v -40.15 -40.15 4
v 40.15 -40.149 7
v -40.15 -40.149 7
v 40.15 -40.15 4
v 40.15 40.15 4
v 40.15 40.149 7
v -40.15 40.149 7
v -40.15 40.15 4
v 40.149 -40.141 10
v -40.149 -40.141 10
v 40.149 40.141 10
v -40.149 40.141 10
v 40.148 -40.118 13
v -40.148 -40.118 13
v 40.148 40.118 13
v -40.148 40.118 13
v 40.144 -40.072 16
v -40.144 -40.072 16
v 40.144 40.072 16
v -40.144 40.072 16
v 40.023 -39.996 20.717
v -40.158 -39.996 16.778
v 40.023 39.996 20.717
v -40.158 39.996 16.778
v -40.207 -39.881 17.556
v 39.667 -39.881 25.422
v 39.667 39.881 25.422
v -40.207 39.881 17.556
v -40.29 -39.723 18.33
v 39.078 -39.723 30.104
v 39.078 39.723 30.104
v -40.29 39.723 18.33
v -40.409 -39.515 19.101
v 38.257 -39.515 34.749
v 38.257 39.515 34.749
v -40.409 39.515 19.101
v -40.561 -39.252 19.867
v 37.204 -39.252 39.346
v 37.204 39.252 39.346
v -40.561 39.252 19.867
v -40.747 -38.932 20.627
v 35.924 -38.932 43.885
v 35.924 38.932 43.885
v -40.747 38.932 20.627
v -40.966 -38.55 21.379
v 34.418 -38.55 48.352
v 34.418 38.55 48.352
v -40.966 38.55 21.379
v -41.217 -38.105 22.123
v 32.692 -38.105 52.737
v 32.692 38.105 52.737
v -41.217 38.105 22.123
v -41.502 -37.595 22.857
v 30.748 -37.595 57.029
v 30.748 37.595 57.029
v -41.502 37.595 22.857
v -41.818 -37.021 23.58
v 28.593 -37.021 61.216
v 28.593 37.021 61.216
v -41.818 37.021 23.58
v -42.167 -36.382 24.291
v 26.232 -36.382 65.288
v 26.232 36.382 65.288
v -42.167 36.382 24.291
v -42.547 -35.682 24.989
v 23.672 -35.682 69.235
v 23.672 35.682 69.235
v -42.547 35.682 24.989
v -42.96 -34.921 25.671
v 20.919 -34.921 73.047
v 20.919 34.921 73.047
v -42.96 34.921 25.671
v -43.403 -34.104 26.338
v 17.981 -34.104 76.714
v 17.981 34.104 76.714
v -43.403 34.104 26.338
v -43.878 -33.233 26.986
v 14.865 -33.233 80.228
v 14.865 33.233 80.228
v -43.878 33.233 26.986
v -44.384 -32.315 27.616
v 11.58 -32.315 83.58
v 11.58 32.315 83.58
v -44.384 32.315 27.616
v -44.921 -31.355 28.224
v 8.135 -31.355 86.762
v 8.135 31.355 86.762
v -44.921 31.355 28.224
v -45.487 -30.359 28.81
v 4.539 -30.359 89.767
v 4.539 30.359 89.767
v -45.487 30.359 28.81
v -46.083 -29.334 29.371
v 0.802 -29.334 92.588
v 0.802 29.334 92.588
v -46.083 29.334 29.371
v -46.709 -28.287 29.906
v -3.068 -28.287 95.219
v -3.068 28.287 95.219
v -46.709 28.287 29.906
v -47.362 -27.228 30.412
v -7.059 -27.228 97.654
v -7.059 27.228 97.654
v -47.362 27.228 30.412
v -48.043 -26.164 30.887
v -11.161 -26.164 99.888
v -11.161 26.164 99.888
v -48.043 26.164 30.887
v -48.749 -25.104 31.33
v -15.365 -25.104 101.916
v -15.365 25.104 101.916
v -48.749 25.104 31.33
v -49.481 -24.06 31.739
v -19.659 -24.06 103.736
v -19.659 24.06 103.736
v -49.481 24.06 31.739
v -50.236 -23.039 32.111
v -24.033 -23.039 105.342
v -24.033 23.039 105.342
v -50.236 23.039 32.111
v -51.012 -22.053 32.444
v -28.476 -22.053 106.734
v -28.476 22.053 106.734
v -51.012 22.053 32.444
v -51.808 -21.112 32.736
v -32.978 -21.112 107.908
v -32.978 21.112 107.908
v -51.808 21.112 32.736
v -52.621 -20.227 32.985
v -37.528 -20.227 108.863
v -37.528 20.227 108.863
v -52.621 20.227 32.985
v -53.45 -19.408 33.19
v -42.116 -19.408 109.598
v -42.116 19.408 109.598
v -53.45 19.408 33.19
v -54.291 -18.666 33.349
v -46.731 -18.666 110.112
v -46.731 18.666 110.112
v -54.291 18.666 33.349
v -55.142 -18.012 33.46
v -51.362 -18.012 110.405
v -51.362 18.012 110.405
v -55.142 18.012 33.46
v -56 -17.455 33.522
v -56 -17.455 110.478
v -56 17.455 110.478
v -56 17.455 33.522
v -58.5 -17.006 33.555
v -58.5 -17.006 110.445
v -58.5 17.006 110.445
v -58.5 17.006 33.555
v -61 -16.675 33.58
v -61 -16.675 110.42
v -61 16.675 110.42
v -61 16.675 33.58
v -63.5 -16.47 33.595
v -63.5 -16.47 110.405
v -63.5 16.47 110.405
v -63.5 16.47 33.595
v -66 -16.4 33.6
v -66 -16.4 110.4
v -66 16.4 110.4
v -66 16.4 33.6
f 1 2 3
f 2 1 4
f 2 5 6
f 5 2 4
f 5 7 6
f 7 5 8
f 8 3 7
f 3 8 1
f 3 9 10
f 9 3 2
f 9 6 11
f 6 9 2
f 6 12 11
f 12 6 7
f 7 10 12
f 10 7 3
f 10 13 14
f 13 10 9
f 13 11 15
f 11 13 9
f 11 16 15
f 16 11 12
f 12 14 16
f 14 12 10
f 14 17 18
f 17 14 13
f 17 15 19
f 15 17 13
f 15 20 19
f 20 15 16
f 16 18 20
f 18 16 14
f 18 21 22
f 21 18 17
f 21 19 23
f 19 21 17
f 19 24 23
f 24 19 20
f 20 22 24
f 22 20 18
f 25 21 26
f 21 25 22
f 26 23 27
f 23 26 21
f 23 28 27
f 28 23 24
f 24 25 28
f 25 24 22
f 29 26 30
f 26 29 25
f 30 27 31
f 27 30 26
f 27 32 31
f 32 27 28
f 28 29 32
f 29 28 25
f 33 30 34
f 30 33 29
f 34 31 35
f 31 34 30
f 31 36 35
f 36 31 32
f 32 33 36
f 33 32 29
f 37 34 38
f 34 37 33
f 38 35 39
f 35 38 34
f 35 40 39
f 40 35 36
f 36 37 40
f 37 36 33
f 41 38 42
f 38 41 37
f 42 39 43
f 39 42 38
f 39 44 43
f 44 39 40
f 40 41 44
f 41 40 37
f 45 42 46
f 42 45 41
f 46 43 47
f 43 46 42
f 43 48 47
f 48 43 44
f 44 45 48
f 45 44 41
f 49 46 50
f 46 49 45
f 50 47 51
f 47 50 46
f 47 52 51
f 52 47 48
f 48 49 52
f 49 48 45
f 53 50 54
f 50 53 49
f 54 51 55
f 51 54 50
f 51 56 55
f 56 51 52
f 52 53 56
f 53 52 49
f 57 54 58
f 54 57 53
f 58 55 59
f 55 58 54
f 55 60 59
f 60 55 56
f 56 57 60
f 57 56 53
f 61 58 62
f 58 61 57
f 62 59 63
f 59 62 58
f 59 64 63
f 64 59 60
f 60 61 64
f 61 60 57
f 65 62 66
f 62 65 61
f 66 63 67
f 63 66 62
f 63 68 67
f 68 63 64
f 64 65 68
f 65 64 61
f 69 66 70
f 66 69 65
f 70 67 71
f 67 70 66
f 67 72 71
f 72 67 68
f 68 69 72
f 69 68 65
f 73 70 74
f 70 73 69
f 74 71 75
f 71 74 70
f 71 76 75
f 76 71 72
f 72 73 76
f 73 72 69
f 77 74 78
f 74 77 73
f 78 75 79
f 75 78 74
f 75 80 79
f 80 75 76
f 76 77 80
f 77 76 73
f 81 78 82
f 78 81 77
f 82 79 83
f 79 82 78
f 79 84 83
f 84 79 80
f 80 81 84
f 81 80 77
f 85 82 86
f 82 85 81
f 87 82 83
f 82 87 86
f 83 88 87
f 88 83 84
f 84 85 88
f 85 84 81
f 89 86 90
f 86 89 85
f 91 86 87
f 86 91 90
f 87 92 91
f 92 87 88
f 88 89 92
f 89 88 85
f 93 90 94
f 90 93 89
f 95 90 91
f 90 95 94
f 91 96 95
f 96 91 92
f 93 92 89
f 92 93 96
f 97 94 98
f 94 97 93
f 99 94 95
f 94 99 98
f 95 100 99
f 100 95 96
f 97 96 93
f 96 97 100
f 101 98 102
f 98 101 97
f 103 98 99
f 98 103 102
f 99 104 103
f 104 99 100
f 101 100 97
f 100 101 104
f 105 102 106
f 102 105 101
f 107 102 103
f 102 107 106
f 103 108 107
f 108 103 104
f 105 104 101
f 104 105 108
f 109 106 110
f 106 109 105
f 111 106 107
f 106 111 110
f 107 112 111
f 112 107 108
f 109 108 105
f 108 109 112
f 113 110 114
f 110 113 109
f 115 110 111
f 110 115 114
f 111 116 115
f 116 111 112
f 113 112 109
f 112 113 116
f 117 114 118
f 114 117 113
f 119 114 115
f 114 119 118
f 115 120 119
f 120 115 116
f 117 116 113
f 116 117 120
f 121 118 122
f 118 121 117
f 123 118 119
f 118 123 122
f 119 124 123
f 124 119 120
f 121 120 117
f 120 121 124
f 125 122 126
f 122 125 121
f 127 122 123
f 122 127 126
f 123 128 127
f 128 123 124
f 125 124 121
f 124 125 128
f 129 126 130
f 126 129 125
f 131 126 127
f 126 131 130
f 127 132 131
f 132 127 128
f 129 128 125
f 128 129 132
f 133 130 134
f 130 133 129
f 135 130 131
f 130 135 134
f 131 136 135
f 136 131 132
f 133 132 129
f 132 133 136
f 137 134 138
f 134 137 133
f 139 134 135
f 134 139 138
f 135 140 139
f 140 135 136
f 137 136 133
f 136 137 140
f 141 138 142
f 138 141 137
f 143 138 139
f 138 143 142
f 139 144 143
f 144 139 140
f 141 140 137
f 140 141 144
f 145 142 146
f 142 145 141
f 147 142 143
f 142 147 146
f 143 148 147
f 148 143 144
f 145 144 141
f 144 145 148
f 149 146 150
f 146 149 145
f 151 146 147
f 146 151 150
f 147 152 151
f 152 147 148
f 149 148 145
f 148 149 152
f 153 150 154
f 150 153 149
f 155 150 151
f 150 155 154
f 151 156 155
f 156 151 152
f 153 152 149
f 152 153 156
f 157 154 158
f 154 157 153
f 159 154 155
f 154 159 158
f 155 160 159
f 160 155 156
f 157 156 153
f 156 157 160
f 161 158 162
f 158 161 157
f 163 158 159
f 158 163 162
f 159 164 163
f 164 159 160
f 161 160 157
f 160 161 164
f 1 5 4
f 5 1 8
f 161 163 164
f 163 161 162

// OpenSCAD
// 80 mm case fan -> 72 x 28 mm right-angle duct adapter
//
// Axis convention
//   Fan flange lies in the XY plane (z = 0 .. flange_t), air enters along +Z.
//   The 90 deg turn happens in the XZ plane, so the bend axis is Y.
//   The 28 mm outlet side is parallel to that bend axis (Y).
//   The 72 mm outlet side is the in-plane / radial dimension (Z at the outlet).
//   Air exits along -X.
//
// The duct is a watertight loft of matching rectangular rings along a
// vertical-lead + circular-arc + horizontal-lead path. Inner and outer lofts
// are differenced, then a fan flange and outlet rim are unioned on.
//
// Units: mm.

$fn = 64;

// ---------------- user parameters ----------------
fan_frame      = 80;     // nominal fan frame (informational)
fan_hole_pitch = 71.5;   // standard 80 mm fan mounting hole spacing
fan_hole_d     = 4.5;    // clearance for M4 screws

inlet_clear    = 75.5;   // clear square throat at the fan
wall           = 2.4;    // duct wall thickness
flange_t       = 5.0;    // fan-side flange thickness
flange_outer   = 88;     // fan-side flange outer size

out_radial     = 72;     // outlet clear dimension IN the bend plane (Z)
out_axis       = 28;     // outlet clear dimension ALONG bend axis (Y)
out_lip        = 10;     // straight horizontal run after the arc
rim_t          = 3.0;    // outlet rim axial thickness
rim_extra      = 3.0;    // outlet rim overhang per side

center_R       = 56;     // centerline radius of the 90 deg bend
lead_in        = 12;     // straight vertical lead before the arc

n_straight     = 4;
n_bend         = 32;
n_out          = 4;
taper_exp      = 1.6;    // >1 keeps the section fat deeper into the bend

// ---------------- derived ----------------
in_half  = inlet_clear/2;
out_r_half = out_radial/2;
out_a_half = out_axis/2;

z_start   = flange_t - 1 + lead_in;       // arc start height (duct overlaps flange)
outlet_x  = -center_R - out_lip;          // outlet duct plane
outlet_z  = z_start + center_R;           // outlet center height

// ---------------- helpers ----------------
function lerp(a,b,t) = a + (b-a)*t;
function smooth(t) = t*t*(3-2*t);
function taper(u) = pow(smooth(u), taper_exp);

// Section: [cx, cz, nx, nz, half_radial, half_axis]
//   (nx,nz) is the in-plane radial unit vector; tangent is perpendicular.
function path_sections(n) = [
    for (i=[0:n])
    let (
        ns = n_straight, nb = n_bend, no = n_out,
        seg = i < ns ? 0 : (i < ns+nb ? 1 : 2),
        u   = seg == 0 ? i/ns
            : seg == 1 ? (i-ns)/nb
            : (i-ns-nb)/no,
        th  = seg == 0 ? 0 : (seg == 1 ? u*90 : 90),
        cx  = seg == 0 ? 0
            : seg == 1 ? -center_R + center_R*cos(th)
            : -center_R - out_lip*u,
        cz  = seg == 0 ? z_start - lead_in*(1-u)
            : seg == 1 ? z_start + center_R*sin(th)
            : z_start + center_R,
        nx  = seg == 0 ? 1 : (seg == 1 ? cos(th) : 0),
        nz  = seg == 0 ? 0 : (seg == 1 ? sin(th) : 1),
        g   = taper(i/n),
        hr  = lerp(in_half, out_r_half, g),
        ha  = lerp(in_half, out_a_half, g)
    )
    [cx, cz, nx, nz, hr, ha]
];

function corner(s, a, b, off) =
    [ s[0] + s[2]*a*(s[4]+off),
      b*(s[5]+off),
      s[1] + s[3]*a*(s[4]+off) ];

function ring_verts(sections, off) = [
    for (s=sections) each [
        corner(s,-1,-1,off), corner(s, 1,-1,off),
        corner(s, 1, 1,off), corner(s,-1, 1,off)
    ]
];

function side_faces(nr) = [
    for (i=[0:nr-2], j=[0:3])
    let (a=4*i+j, b=4*i+(j+1)%4,
         c=4*(i+1)+(j+1)%4, d=4*(i+1)+j)
    [d,c,b,a]
];

function cap_faces(nr) = concat(
    [[0,1,2,3]],
    [[4*(nr-1)+3, 4*(nr-1)+2, 4*(nr-1)+1, 4*(nr-1)]]
);

module swept(sections, off) {
    nr = len(sections);
    polyhedron(ring_verts(sections, off),
               concat(side_faces(nr), cap_faces(nr)),
               convex=false);
}

module fan_flange() {
    difference() {
        translate([0,0,flange_t/2])
            cube([flange_outer, flange_outer, flange_t], center=true);
        translate([0,0,-1])
            cube([inlet_clear, inlet_clear, flange_t+2], center=true);
        for (sx=[-1,1], sy=[-1,1])
            translate([sx*fan_hole_pitch/2, sy*fan_hole_pitch/2, -1])
                cylinder(d=fan_hole_d, h=flange_t+2);
    }
}

module outlet_rim() {
    ow = out_axis + 2*wall + 2*rim_extra;   // Y extent
    oh = out_radial + 2*wall + 2*rim_extra; // Z extent
    difference() {
        translate([outlet_x-rim_t, -ow/2, outlet_z-oh/2])
            cube([rim_t, ow, oh], center=false);
        translate([outlet_x-rim_t-1, -out_axis/2, outlet_z-out_radial/2])
            cube([rim_t+2, out_axis, out_radial], center=false);
    }
}

module adapter() {
    n = n_straight + n_bend + n_out;
    sec = path_sections(n);
    union() {
        difference() {
            swept(sec, wall);   // outer loft
            swept(sec, 0);      // clear bore
        }
        fan_flange();
        outlet_rim();
    }
}


render() { swept(path_sections(n_straight+n_bend+n_out), wall); }
